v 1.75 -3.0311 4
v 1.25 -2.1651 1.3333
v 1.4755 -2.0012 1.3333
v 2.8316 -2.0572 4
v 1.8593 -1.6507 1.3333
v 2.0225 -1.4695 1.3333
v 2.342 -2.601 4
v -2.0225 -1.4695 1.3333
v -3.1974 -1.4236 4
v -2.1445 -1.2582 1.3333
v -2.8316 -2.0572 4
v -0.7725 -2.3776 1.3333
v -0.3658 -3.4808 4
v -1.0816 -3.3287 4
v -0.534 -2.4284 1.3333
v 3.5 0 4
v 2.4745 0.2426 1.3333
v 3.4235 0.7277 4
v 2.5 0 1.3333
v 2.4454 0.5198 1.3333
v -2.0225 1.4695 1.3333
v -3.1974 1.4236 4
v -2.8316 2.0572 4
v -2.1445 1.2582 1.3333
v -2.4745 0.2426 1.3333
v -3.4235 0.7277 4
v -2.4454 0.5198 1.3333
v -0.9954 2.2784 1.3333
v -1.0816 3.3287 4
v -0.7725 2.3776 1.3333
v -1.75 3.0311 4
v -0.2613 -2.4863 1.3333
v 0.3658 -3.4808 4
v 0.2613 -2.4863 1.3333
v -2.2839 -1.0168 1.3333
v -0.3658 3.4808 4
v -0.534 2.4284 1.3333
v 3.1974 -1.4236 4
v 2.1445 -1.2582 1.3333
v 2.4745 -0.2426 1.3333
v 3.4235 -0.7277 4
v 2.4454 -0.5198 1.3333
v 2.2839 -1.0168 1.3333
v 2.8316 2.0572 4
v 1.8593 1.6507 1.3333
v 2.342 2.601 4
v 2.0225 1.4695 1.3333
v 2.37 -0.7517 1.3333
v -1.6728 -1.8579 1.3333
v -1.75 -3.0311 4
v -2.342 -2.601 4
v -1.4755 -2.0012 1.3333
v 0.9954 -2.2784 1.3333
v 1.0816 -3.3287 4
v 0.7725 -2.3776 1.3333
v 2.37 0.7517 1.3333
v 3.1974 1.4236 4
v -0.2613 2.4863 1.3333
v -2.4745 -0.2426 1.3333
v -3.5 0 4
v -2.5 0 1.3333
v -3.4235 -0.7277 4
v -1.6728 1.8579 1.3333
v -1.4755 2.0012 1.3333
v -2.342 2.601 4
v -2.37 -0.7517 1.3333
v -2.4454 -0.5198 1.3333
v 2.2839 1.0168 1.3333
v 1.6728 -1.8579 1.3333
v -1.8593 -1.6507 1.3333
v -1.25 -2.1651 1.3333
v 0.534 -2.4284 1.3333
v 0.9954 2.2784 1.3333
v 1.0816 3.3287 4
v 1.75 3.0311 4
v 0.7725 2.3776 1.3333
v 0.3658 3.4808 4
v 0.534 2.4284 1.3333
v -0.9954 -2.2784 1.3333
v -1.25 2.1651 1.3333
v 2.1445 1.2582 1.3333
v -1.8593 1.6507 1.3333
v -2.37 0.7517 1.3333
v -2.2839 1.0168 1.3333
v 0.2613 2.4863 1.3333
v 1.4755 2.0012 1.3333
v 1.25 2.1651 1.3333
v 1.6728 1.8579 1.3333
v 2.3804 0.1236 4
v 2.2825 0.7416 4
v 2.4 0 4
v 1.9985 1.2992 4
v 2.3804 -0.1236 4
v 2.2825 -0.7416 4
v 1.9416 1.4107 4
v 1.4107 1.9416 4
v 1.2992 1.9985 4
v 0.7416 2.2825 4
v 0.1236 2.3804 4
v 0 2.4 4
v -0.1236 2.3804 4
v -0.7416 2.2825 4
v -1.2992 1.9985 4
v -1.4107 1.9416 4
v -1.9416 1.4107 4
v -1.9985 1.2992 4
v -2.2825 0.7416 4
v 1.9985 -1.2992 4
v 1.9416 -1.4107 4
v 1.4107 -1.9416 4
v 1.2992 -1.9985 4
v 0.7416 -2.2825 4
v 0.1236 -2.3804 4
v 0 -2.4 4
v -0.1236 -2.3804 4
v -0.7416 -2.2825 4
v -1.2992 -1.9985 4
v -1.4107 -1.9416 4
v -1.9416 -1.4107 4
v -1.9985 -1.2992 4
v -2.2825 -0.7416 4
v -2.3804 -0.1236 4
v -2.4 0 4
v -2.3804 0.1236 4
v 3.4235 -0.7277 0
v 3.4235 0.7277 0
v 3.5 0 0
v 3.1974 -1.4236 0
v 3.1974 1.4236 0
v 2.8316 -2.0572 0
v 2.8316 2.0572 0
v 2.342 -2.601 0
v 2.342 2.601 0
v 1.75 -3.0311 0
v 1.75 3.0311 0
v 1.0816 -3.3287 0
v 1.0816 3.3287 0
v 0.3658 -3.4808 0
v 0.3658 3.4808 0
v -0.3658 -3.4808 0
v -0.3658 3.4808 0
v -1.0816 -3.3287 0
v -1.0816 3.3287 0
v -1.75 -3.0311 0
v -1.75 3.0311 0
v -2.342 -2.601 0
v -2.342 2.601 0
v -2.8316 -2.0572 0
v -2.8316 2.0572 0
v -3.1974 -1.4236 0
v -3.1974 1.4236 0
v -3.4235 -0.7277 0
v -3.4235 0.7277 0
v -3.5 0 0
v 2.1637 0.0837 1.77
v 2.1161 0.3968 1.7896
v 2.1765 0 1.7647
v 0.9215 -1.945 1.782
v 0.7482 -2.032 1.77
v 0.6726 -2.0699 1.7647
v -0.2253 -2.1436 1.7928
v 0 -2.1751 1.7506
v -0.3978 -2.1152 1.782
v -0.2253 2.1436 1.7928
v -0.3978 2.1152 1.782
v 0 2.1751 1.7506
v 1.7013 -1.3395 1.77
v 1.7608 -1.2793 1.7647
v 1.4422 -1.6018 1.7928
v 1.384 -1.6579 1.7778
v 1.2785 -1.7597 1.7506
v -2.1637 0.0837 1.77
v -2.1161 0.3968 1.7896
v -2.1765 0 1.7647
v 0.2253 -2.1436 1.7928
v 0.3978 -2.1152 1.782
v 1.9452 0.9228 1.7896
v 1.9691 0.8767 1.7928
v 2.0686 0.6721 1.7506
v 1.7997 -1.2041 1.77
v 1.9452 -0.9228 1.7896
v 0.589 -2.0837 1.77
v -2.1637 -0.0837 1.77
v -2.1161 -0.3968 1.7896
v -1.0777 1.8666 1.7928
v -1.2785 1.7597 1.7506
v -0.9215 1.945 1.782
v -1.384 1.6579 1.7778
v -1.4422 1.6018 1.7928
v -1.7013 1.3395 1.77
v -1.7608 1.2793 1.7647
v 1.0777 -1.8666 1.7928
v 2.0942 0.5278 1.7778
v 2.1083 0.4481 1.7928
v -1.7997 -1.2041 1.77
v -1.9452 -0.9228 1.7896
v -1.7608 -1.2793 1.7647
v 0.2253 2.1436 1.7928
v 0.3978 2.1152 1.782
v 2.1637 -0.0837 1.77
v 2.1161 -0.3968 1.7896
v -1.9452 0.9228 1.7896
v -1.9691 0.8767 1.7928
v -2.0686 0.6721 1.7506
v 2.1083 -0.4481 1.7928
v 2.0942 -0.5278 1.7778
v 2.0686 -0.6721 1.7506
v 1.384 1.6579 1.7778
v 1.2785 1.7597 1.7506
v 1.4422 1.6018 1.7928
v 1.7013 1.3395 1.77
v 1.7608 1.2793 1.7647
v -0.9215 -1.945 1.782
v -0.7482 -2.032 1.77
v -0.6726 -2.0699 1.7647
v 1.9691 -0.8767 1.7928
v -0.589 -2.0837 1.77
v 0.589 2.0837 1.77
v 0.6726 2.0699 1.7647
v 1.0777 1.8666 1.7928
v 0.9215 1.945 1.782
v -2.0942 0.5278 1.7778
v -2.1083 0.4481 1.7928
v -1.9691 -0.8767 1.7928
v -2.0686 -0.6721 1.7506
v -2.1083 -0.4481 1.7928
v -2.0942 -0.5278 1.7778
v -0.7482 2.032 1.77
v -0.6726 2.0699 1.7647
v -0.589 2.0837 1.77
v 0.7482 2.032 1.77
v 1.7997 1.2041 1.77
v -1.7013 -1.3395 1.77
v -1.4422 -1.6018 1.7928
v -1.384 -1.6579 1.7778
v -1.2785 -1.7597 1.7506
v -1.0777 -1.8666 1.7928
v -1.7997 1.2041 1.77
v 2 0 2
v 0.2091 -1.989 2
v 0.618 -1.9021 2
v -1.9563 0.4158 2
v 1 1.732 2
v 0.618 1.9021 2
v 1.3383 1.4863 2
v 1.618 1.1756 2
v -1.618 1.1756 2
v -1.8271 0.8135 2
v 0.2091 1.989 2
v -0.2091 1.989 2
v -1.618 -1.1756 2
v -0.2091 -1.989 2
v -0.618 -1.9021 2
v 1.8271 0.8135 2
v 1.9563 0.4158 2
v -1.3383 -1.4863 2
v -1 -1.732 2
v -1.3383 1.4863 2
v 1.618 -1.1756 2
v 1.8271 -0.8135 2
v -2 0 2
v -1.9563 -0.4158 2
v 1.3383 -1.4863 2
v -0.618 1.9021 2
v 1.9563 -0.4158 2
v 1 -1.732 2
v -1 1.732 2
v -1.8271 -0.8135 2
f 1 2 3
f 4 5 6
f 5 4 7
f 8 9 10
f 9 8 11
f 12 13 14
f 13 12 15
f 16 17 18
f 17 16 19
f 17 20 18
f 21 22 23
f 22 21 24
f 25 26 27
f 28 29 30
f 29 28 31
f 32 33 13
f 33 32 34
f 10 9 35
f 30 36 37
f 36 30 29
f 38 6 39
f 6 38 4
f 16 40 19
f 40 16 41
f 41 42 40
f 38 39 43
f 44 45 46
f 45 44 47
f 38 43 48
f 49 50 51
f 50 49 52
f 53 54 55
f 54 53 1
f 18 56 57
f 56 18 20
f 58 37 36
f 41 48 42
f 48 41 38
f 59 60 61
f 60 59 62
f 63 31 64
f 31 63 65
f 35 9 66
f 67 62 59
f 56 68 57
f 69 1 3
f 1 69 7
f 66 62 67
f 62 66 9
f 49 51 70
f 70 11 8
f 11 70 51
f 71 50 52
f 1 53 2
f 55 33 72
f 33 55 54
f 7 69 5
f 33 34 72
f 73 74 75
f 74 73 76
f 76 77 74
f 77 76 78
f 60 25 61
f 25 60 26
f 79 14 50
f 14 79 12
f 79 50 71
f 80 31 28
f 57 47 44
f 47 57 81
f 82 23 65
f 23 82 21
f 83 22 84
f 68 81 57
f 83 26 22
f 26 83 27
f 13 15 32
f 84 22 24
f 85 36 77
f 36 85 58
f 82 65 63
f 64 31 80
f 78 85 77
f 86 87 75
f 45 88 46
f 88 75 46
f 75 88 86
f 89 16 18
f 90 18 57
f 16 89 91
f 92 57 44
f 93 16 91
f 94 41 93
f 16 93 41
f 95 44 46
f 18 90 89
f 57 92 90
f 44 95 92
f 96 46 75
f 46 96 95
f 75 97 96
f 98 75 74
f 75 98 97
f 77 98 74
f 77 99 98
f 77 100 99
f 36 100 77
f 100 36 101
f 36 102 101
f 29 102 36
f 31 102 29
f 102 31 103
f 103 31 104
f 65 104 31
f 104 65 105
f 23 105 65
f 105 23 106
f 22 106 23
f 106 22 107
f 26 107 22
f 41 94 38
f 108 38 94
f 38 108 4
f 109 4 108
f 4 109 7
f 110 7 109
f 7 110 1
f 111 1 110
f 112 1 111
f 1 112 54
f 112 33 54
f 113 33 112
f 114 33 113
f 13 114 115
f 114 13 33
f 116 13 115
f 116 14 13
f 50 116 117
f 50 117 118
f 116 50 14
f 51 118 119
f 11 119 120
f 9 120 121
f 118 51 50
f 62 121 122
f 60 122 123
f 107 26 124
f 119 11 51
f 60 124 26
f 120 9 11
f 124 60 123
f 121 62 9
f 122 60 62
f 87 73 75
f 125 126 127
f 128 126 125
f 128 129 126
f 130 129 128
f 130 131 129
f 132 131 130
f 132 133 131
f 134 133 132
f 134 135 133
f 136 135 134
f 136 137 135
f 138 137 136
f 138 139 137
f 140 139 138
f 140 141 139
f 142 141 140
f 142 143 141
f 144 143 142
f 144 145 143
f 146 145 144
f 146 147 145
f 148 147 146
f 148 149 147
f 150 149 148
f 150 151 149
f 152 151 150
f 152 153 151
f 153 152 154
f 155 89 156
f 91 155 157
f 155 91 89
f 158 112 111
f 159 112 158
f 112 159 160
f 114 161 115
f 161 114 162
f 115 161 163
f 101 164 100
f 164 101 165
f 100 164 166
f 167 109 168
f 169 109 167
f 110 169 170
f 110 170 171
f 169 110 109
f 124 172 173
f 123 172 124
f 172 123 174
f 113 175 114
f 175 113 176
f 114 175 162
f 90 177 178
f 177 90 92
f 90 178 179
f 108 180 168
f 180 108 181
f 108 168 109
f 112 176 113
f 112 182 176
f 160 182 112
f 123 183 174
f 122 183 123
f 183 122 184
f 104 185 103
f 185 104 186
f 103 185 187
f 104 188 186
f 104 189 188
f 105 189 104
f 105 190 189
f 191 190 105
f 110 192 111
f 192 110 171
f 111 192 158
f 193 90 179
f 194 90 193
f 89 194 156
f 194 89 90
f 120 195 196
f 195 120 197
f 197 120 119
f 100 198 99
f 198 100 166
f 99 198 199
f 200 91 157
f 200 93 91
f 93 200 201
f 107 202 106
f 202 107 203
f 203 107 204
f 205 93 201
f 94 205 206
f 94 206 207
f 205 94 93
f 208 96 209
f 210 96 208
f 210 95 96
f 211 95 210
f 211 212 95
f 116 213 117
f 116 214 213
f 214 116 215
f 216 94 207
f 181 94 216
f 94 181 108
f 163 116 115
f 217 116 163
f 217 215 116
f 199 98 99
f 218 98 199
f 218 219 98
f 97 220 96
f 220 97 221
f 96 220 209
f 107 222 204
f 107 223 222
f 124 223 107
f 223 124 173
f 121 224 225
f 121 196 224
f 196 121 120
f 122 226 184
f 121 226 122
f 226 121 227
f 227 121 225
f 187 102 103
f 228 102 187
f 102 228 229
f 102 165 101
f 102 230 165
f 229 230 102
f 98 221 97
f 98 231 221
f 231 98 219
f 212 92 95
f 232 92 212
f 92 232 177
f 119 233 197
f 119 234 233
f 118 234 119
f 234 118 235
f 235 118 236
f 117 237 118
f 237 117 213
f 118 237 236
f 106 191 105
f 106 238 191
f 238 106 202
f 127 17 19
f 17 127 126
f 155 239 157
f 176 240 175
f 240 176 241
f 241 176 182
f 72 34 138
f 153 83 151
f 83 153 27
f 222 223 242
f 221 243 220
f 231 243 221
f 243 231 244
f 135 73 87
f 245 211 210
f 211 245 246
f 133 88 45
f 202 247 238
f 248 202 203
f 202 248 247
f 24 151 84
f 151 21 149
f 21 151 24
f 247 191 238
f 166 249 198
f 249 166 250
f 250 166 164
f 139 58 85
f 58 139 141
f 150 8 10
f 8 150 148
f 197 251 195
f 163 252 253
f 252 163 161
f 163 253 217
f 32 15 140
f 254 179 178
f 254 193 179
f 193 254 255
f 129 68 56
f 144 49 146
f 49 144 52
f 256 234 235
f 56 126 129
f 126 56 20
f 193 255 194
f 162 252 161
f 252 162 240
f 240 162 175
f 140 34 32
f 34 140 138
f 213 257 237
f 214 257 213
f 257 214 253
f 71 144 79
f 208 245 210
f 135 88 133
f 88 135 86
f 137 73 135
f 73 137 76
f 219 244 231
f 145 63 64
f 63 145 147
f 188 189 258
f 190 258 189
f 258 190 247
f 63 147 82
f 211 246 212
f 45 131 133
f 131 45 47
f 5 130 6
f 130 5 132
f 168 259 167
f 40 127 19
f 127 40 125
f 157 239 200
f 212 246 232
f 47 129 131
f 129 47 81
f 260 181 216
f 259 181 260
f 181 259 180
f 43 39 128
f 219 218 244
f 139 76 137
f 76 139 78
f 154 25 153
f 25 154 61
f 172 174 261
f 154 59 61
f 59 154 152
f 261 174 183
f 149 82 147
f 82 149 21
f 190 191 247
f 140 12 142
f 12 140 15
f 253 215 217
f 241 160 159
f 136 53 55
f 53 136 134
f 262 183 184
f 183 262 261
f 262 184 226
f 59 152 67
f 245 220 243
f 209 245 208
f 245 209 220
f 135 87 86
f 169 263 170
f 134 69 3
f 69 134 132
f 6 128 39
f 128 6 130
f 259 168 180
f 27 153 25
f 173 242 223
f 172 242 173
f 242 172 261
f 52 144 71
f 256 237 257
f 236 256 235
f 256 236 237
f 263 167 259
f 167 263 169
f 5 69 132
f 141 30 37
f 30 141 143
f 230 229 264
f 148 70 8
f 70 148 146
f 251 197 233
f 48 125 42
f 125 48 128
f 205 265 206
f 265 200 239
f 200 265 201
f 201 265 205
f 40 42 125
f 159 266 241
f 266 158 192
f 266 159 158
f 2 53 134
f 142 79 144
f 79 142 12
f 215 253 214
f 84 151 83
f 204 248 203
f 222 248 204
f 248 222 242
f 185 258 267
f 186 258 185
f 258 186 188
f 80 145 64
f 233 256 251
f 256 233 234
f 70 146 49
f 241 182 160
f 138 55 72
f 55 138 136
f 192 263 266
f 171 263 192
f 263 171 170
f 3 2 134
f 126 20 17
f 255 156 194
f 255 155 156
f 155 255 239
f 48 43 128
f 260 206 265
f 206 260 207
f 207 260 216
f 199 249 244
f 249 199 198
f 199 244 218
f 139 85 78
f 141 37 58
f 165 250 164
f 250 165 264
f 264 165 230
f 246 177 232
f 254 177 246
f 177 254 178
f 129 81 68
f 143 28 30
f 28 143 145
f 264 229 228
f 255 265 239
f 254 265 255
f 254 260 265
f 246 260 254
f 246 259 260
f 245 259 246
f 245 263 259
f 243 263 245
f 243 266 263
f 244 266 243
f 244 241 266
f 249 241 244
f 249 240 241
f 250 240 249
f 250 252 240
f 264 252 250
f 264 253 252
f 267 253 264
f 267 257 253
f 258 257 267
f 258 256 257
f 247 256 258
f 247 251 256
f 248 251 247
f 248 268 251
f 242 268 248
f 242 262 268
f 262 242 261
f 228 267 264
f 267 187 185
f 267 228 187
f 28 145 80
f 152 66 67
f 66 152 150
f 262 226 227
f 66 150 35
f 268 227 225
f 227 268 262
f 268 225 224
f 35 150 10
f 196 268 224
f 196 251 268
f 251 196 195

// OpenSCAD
$fn=30;
difference(){
cylinder(h=4, r1=2, r2=3.5, center=false); 
cylinder(h=5, r1=2, r2=2.5, $fn=20);
}
cylinder(h=2, r1=3.5, r2=2, center=false);
